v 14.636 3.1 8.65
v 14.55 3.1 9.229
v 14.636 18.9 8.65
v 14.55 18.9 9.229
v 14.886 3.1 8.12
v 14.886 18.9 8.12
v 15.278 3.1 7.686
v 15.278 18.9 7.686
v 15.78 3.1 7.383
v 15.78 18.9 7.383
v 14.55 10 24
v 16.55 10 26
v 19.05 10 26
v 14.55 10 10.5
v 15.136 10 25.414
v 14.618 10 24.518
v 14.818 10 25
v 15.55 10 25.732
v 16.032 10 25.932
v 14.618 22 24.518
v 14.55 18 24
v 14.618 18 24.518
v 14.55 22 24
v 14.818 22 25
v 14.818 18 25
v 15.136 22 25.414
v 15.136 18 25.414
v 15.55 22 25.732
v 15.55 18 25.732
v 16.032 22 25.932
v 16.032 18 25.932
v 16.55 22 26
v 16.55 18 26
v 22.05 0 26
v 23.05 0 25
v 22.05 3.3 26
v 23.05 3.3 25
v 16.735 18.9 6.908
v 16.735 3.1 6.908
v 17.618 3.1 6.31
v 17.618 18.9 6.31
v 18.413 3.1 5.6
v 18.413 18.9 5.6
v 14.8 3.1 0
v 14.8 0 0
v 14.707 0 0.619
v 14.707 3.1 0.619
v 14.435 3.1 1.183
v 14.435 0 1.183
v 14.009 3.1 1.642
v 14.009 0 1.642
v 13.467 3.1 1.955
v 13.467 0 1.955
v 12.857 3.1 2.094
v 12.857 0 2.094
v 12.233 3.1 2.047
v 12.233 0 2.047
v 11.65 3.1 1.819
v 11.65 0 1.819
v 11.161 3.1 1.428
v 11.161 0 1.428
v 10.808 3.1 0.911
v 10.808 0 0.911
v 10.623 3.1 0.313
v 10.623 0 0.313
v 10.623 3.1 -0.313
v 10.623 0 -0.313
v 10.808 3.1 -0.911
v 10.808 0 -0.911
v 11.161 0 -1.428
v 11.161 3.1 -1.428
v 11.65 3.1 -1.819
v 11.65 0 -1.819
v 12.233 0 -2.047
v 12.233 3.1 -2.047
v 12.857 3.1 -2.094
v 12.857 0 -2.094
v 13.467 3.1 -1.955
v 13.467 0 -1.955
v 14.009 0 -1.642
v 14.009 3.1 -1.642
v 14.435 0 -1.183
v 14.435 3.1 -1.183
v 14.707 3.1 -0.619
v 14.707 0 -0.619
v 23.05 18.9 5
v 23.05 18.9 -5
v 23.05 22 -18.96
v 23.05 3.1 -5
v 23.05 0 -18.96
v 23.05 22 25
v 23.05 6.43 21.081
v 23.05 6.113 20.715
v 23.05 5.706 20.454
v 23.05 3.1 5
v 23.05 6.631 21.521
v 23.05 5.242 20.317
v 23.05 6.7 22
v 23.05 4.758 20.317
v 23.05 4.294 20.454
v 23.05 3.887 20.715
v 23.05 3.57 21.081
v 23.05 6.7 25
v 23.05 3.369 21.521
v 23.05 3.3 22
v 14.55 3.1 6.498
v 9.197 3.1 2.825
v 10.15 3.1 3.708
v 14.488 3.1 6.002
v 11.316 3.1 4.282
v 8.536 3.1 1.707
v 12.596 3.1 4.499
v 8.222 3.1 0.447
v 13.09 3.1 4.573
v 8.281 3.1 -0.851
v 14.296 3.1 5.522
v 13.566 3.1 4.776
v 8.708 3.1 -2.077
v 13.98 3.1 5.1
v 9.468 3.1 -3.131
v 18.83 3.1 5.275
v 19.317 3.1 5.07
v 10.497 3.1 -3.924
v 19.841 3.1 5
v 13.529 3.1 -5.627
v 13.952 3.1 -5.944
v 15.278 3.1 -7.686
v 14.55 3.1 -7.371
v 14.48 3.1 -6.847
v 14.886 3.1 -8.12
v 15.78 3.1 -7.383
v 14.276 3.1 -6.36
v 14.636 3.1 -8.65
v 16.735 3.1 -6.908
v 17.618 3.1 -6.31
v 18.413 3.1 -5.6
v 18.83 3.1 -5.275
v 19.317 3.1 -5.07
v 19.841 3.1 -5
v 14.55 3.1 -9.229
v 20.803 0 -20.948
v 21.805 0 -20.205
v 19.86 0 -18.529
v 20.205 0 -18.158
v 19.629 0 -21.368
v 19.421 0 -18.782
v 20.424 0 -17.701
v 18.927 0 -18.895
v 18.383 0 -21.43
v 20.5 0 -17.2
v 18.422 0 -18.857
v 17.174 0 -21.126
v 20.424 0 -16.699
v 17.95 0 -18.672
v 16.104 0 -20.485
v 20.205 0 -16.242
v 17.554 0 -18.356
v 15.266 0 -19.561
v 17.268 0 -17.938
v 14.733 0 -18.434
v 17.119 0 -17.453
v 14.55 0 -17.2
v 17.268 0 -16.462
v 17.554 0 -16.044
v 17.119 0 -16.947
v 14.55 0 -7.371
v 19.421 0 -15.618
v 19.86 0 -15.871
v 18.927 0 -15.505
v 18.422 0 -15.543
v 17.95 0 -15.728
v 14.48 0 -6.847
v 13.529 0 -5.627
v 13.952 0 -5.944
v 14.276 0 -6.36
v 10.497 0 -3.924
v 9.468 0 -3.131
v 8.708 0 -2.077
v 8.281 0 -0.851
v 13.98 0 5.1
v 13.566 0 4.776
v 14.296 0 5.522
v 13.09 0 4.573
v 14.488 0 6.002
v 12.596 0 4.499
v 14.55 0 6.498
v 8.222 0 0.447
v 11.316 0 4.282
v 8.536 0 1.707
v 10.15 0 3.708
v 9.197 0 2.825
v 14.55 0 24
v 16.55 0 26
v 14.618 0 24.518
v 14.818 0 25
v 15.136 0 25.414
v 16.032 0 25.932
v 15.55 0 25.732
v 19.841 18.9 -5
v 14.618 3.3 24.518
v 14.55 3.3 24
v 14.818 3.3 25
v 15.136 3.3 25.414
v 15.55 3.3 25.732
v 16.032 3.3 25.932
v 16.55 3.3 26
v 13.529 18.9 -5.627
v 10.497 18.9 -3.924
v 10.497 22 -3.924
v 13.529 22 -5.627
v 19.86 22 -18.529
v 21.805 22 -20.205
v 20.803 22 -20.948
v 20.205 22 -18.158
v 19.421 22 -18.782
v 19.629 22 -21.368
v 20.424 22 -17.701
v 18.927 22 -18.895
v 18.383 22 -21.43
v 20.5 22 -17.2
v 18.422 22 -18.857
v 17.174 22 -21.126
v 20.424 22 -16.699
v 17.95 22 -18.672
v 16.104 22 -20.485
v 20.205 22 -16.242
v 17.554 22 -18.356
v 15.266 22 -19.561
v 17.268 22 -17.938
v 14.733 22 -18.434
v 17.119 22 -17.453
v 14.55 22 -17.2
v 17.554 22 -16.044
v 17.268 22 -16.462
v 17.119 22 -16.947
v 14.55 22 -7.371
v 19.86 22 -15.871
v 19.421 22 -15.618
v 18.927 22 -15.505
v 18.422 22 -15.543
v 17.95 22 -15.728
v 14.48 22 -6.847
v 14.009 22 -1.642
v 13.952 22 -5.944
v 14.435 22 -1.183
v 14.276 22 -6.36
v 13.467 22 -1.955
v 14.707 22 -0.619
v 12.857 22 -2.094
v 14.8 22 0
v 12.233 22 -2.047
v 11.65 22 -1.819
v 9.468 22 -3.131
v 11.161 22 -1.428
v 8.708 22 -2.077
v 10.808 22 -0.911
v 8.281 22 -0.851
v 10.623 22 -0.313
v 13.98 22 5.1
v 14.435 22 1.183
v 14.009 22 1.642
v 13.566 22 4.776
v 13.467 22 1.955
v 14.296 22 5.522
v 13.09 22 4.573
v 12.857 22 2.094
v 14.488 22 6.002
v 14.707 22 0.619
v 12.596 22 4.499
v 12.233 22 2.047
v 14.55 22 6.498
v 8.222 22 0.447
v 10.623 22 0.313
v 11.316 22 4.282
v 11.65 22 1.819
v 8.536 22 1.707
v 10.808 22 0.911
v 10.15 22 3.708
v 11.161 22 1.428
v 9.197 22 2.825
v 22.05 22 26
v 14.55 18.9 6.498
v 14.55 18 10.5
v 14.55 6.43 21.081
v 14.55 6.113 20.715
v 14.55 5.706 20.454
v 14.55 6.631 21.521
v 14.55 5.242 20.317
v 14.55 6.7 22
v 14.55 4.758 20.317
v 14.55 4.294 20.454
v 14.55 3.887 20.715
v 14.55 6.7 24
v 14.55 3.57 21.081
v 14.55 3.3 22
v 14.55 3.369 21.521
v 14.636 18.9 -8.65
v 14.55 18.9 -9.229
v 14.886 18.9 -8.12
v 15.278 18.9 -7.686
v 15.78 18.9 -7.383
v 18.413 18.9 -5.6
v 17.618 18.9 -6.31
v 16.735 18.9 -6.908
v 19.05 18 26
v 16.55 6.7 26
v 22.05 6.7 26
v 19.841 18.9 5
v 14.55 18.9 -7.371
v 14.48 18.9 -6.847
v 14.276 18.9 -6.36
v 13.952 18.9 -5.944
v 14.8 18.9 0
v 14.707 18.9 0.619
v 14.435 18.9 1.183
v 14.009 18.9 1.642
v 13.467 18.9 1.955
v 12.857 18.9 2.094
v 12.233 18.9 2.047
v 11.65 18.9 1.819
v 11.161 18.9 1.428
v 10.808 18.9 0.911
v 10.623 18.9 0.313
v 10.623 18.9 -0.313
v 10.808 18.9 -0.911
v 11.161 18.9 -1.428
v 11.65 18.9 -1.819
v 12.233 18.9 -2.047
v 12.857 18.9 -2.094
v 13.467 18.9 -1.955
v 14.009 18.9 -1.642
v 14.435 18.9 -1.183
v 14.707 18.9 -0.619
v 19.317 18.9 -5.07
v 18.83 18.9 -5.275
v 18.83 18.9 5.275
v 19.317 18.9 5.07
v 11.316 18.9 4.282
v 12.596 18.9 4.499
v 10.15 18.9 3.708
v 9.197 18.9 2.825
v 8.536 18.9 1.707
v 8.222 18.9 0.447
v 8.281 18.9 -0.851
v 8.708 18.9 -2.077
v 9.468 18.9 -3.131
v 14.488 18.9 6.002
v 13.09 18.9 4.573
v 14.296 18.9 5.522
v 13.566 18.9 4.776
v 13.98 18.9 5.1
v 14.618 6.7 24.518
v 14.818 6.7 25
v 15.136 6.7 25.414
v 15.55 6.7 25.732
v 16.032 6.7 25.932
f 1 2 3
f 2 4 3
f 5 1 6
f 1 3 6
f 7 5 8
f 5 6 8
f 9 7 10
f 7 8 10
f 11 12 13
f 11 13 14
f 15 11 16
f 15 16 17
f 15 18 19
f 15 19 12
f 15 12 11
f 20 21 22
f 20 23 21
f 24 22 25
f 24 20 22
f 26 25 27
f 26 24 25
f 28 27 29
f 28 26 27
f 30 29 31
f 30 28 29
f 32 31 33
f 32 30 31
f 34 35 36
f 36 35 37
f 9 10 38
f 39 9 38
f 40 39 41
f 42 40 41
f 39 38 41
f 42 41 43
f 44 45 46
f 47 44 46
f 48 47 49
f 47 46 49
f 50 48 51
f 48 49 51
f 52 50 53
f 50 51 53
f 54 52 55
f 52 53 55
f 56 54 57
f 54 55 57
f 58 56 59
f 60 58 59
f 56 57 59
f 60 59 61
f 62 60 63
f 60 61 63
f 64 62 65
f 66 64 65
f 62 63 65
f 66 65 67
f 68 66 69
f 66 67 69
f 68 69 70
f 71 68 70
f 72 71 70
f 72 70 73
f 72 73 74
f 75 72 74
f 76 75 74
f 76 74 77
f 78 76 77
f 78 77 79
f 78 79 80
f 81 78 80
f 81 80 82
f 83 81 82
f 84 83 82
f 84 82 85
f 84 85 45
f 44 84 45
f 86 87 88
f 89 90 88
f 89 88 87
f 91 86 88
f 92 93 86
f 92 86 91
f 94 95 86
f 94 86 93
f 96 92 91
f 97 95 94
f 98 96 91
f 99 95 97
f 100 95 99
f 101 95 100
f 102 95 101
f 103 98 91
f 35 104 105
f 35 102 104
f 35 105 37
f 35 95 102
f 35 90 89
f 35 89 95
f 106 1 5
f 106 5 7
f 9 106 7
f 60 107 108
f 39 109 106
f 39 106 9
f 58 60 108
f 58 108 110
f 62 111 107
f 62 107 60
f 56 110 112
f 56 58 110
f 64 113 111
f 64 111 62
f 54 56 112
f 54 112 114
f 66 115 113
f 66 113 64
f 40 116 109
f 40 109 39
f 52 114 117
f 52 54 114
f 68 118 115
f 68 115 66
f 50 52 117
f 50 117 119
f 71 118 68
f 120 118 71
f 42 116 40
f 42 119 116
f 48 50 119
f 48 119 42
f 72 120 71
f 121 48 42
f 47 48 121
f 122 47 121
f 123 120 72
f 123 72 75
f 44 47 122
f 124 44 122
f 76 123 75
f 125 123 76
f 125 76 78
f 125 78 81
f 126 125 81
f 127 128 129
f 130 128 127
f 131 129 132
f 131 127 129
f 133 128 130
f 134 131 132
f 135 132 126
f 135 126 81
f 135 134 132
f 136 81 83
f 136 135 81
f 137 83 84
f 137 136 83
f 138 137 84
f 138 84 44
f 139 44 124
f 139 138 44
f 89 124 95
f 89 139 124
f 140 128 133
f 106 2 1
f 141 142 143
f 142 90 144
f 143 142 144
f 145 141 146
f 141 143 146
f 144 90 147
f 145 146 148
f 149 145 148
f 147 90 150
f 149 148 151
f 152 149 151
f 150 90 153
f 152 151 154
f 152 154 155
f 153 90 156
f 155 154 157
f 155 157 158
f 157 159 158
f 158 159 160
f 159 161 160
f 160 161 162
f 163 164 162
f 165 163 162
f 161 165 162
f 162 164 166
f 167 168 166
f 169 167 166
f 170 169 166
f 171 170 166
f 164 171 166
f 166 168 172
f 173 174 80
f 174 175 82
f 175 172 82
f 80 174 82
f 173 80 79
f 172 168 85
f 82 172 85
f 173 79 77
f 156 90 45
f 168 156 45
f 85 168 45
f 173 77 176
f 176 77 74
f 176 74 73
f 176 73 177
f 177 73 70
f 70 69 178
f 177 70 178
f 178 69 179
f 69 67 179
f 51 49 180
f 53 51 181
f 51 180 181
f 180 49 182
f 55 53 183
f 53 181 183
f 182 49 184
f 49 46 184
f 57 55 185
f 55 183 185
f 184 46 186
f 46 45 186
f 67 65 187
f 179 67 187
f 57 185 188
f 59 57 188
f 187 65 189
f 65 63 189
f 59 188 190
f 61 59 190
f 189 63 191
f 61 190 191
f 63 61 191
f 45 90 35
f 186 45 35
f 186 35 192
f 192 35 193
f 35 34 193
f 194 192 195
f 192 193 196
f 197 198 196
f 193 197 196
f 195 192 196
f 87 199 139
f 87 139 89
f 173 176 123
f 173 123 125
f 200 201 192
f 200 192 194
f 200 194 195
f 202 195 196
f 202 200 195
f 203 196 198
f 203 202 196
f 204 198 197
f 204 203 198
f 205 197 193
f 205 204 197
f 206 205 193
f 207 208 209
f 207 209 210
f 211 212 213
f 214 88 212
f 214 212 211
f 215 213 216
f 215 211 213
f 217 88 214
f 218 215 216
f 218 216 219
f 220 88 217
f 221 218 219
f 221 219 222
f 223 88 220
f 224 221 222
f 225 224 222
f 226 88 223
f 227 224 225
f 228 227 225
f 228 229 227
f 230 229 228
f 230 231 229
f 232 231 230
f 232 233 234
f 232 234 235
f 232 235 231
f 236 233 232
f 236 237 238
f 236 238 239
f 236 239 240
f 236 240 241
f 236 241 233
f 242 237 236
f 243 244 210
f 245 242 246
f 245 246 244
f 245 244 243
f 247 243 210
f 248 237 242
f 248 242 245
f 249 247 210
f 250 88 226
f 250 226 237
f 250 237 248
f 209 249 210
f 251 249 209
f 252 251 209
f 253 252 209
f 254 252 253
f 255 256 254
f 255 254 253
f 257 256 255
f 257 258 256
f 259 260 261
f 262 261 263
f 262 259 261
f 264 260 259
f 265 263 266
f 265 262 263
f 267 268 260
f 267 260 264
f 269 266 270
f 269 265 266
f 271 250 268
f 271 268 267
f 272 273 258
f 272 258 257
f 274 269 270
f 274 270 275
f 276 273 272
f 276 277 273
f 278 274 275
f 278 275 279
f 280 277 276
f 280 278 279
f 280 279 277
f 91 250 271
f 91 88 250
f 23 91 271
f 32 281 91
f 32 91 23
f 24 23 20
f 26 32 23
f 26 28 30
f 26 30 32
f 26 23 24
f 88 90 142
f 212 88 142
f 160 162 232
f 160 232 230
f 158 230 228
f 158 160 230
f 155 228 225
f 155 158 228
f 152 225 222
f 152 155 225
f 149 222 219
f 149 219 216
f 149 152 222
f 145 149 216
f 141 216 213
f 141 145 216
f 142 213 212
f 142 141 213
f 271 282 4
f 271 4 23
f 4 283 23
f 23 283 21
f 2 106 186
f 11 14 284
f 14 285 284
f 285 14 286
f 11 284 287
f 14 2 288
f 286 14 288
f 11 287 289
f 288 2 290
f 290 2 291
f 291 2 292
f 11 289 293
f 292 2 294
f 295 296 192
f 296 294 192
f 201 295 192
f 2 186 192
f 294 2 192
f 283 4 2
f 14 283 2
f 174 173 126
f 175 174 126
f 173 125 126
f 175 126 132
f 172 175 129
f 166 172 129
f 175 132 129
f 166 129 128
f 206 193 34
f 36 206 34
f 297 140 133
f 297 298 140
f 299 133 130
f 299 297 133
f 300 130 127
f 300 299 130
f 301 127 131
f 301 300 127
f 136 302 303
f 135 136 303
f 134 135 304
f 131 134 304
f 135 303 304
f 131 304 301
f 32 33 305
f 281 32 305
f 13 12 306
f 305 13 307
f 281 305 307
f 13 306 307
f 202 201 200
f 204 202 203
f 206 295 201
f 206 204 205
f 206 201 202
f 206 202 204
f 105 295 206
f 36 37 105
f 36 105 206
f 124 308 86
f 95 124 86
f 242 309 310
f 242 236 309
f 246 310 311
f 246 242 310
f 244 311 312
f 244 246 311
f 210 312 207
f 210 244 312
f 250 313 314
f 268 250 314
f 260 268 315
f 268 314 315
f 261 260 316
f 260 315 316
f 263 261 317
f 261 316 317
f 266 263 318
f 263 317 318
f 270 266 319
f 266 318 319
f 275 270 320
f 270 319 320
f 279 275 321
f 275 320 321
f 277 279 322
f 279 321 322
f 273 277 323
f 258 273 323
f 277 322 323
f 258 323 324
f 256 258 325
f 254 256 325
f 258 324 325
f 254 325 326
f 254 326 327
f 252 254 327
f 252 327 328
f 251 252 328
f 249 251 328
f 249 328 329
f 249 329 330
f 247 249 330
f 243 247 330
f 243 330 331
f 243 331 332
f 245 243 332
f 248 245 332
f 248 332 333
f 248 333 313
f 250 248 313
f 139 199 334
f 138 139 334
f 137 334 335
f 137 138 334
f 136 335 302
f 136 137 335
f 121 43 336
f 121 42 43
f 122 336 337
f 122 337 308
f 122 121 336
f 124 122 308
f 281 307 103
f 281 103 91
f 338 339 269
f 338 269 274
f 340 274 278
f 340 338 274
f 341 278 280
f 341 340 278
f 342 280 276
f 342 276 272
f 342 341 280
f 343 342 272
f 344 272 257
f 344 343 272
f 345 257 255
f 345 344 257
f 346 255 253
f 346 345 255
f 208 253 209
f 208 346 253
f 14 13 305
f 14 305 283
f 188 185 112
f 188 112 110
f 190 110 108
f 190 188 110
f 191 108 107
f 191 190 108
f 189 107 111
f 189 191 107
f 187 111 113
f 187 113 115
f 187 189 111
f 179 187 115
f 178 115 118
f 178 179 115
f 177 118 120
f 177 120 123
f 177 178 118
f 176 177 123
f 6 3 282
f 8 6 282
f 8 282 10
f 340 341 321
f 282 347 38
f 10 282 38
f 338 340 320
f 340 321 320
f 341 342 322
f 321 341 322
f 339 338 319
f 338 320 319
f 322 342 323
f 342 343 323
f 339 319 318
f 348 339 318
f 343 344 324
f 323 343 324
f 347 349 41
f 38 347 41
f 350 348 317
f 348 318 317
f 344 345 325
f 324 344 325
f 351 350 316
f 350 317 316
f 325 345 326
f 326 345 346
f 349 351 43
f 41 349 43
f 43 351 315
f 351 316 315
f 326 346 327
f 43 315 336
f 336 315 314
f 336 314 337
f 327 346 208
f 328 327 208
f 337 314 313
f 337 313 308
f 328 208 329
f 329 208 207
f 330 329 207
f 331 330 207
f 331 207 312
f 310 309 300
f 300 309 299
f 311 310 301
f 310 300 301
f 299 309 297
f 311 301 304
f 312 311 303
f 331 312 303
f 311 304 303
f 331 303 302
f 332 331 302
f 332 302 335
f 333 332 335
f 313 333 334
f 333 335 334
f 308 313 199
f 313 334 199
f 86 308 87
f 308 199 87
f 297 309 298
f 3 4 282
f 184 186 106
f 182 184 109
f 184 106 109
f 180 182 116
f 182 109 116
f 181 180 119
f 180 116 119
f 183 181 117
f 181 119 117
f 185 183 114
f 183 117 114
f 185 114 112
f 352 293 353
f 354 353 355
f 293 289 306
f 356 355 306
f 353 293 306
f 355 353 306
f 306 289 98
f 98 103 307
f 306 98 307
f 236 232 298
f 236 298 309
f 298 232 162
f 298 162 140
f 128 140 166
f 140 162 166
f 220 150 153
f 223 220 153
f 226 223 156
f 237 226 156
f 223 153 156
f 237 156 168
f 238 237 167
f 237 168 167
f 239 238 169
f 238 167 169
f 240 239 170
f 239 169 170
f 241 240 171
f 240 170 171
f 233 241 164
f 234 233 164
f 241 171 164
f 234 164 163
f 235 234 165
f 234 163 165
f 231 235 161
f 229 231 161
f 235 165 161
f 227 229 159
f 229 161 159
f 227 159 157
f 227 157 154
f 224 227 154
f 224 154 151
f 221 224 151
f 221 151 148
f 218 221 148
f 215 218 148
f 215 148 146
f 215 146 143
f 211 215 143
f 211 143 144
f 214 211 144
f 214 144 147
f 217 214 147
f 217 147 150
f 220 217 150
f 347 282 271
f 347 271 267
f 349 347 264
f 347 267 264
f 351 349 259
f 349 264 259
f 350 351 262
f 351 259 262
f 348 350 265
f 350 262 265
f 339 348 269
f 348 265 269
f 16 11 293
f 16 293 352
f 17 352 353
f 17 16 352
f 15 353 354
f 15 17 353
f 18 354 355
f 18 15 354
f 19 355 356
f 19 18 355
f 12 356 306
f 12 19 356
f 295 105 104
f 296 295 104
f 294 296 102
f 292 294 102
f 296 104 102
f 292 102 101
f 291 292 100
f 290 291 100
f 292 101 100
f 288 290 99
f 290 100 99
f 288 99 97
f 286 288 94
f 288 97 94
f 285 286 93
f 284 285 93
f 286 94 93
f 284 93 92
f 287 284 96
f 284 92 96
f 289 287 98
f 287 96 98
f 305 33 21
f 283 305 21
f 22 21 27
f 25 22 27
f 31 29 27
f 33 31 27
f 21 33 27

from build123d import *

# Parameters (mm, degrees)
SKETCH013_R     = 2.1
PAD003_DEPTH    = 22
POCKET005_START = -3.1
POCKET005_DEPTH = 15.8
SKETCH017_R     = 1.7
HOLE003_DEPTH   = 25
POCKET007_START = -10
POCKET007_DEPTH = 8
FILLET026_R     = 2
FILLET027_R     = 2
FILLET028_R     = 2
POCKET026_DEPTH = 10
CHAMFER013_SIZE = 1


with BuildPart() as part:
    # Sketch013 → Pad003 (new body)
    with BuildSketch(Plane.XZ):
        with BuildLine():
            Line((14.55, 4.5), (14.55, 26))
            Line((14.55, 26), (23.05, 26))
            Line((23.05, 26), (23.05, -17.2))
            Line((23.05, -18.9604076401), (23.05, -17.2))
            Line((23.05, -18.9604076401), (21.80520382, -20.20520382))
            ThreePointArc((14.55, -17.2), (17.1735954124, -21.1264880132), (21.80520382, -20.20520382))
            Line((14.55, -17.2), (14.55, -6.2))
            Line((10.4965363624, -3.9236141499), (14.55, -6.2))
            ThreePointArc((12.7, 4.5), (8.3464805229, 1.1388011954), (10.4965363624, -3.9236141499))
            Line((14.55, 4.5), (12.7, 4.5))
        make_face()
        with Locations((12.7, 0)):
            Circle(SKETCH013_R, mode=Mode.SUBTRACT)
    extrude(amount=-PAD003_DEPTH)

    # Sketch015 (on Face11 of Pad003) → Pocket005 (cut)
    with BuildSketch(Plane(origin=(0, 22, 0), x_dir=(1, 0, 0), z_dir=(0, 1, 0)).offset(POCKET005_START)):
        with BuildLine():
            ThreePointArc((18.9449979984, 5), (4.7, 0), (18.9449979984, -5))
            Line((18.9449979984, -5), (23.05, -5))
            Line((23.05, 5), (23.05, -5))
            Line((18.9449979984, 5), (23.05, 5))
        make_face()
    extrude(amount=-POCKET005_DEPTH, mode=Mode.SUBTRACT)

    # Sketch017 → Hole003 (cut)
    with BuildSketch(Plane.XZ):
        with Locations((18.8, -17.2)):
            Circle(SKETCH017_R)
    extrude(amount=-HOLE003_DEPTH, mode=Mode.SUBTRACT)

    # Sketch018 (on Face2 of Hole003) → Pocket007 (cut)
    with BuildSketch(Plane.XZ.offset(POCKET007_START)):
        Polygon((19.05, 26), (14.55, 10.5), (14.55, 26), align=None)
    extrude(amount=-POCKET007_DEPTH, mode=Mode.SUBTRACT)

    # Fillet026
    fillet026_edges = [part.edges().sort_by_distance(p)[0] for p in [
        (14.55, 5, 26),
        (14.55, 20, 26),
    ]]
    fillet(fillet026_edges, radius=FILLET026_R)

    # Fillet027
    fillet027_edges = [part.edges().sort_by_distance(p)[0] for p in [
        (14.55, 11, -7.783155),
        (14.55, 11, 7.783155),
        (18.944998, 11, -5),
        (18.944998, 11, 5),
    ]]
    fillet(fillet027_edges, radius=FILLET027_R)

    # Fillet028
    fillet028_edges = [part.edges().sort_by_distance(p)[0] for p in [
        (14.55, 20.45, -6.2),
        (14.55, 1.55, -6.2),
        (14.55, 1.55, 4.5),
        (14.55, 20.45, 4.5),
    ]]
    fillet(fillet028_edges, radius=FILLET028_R)

    # Sketch051 (on Face22 of Fillet028) → Pocket026 (cut)
    with BuildSketch(Plane(origin=(23.05, 0, 0), x_dir=(0, 0, 1), z_dir=(1, 0, 0))):
        with BuildLine():
            ThreePointArc((22, -3.3), (20.3, -5), (22, -6.7))
            Line((22, -6.7), (26, -6.7))
            Line((26, -3.3), (26, -6.7))
            Line((22, -3.3), (26, -3.3))
        make_face()
    extrude(amount=-POCKET026_DEPTH, mode=Mode.SUBTRACT)

    # Chamfer013
    chamfer013_edges = [part.edges().sort_by_distance(p)[0] for p in [
        (23.05, 1.65, 26),
        (23.05, 14.35, 26),
    ]]
    chamfer(chamfer013_edges, length=CHAMFER013_SIZE)


solid = part.part
